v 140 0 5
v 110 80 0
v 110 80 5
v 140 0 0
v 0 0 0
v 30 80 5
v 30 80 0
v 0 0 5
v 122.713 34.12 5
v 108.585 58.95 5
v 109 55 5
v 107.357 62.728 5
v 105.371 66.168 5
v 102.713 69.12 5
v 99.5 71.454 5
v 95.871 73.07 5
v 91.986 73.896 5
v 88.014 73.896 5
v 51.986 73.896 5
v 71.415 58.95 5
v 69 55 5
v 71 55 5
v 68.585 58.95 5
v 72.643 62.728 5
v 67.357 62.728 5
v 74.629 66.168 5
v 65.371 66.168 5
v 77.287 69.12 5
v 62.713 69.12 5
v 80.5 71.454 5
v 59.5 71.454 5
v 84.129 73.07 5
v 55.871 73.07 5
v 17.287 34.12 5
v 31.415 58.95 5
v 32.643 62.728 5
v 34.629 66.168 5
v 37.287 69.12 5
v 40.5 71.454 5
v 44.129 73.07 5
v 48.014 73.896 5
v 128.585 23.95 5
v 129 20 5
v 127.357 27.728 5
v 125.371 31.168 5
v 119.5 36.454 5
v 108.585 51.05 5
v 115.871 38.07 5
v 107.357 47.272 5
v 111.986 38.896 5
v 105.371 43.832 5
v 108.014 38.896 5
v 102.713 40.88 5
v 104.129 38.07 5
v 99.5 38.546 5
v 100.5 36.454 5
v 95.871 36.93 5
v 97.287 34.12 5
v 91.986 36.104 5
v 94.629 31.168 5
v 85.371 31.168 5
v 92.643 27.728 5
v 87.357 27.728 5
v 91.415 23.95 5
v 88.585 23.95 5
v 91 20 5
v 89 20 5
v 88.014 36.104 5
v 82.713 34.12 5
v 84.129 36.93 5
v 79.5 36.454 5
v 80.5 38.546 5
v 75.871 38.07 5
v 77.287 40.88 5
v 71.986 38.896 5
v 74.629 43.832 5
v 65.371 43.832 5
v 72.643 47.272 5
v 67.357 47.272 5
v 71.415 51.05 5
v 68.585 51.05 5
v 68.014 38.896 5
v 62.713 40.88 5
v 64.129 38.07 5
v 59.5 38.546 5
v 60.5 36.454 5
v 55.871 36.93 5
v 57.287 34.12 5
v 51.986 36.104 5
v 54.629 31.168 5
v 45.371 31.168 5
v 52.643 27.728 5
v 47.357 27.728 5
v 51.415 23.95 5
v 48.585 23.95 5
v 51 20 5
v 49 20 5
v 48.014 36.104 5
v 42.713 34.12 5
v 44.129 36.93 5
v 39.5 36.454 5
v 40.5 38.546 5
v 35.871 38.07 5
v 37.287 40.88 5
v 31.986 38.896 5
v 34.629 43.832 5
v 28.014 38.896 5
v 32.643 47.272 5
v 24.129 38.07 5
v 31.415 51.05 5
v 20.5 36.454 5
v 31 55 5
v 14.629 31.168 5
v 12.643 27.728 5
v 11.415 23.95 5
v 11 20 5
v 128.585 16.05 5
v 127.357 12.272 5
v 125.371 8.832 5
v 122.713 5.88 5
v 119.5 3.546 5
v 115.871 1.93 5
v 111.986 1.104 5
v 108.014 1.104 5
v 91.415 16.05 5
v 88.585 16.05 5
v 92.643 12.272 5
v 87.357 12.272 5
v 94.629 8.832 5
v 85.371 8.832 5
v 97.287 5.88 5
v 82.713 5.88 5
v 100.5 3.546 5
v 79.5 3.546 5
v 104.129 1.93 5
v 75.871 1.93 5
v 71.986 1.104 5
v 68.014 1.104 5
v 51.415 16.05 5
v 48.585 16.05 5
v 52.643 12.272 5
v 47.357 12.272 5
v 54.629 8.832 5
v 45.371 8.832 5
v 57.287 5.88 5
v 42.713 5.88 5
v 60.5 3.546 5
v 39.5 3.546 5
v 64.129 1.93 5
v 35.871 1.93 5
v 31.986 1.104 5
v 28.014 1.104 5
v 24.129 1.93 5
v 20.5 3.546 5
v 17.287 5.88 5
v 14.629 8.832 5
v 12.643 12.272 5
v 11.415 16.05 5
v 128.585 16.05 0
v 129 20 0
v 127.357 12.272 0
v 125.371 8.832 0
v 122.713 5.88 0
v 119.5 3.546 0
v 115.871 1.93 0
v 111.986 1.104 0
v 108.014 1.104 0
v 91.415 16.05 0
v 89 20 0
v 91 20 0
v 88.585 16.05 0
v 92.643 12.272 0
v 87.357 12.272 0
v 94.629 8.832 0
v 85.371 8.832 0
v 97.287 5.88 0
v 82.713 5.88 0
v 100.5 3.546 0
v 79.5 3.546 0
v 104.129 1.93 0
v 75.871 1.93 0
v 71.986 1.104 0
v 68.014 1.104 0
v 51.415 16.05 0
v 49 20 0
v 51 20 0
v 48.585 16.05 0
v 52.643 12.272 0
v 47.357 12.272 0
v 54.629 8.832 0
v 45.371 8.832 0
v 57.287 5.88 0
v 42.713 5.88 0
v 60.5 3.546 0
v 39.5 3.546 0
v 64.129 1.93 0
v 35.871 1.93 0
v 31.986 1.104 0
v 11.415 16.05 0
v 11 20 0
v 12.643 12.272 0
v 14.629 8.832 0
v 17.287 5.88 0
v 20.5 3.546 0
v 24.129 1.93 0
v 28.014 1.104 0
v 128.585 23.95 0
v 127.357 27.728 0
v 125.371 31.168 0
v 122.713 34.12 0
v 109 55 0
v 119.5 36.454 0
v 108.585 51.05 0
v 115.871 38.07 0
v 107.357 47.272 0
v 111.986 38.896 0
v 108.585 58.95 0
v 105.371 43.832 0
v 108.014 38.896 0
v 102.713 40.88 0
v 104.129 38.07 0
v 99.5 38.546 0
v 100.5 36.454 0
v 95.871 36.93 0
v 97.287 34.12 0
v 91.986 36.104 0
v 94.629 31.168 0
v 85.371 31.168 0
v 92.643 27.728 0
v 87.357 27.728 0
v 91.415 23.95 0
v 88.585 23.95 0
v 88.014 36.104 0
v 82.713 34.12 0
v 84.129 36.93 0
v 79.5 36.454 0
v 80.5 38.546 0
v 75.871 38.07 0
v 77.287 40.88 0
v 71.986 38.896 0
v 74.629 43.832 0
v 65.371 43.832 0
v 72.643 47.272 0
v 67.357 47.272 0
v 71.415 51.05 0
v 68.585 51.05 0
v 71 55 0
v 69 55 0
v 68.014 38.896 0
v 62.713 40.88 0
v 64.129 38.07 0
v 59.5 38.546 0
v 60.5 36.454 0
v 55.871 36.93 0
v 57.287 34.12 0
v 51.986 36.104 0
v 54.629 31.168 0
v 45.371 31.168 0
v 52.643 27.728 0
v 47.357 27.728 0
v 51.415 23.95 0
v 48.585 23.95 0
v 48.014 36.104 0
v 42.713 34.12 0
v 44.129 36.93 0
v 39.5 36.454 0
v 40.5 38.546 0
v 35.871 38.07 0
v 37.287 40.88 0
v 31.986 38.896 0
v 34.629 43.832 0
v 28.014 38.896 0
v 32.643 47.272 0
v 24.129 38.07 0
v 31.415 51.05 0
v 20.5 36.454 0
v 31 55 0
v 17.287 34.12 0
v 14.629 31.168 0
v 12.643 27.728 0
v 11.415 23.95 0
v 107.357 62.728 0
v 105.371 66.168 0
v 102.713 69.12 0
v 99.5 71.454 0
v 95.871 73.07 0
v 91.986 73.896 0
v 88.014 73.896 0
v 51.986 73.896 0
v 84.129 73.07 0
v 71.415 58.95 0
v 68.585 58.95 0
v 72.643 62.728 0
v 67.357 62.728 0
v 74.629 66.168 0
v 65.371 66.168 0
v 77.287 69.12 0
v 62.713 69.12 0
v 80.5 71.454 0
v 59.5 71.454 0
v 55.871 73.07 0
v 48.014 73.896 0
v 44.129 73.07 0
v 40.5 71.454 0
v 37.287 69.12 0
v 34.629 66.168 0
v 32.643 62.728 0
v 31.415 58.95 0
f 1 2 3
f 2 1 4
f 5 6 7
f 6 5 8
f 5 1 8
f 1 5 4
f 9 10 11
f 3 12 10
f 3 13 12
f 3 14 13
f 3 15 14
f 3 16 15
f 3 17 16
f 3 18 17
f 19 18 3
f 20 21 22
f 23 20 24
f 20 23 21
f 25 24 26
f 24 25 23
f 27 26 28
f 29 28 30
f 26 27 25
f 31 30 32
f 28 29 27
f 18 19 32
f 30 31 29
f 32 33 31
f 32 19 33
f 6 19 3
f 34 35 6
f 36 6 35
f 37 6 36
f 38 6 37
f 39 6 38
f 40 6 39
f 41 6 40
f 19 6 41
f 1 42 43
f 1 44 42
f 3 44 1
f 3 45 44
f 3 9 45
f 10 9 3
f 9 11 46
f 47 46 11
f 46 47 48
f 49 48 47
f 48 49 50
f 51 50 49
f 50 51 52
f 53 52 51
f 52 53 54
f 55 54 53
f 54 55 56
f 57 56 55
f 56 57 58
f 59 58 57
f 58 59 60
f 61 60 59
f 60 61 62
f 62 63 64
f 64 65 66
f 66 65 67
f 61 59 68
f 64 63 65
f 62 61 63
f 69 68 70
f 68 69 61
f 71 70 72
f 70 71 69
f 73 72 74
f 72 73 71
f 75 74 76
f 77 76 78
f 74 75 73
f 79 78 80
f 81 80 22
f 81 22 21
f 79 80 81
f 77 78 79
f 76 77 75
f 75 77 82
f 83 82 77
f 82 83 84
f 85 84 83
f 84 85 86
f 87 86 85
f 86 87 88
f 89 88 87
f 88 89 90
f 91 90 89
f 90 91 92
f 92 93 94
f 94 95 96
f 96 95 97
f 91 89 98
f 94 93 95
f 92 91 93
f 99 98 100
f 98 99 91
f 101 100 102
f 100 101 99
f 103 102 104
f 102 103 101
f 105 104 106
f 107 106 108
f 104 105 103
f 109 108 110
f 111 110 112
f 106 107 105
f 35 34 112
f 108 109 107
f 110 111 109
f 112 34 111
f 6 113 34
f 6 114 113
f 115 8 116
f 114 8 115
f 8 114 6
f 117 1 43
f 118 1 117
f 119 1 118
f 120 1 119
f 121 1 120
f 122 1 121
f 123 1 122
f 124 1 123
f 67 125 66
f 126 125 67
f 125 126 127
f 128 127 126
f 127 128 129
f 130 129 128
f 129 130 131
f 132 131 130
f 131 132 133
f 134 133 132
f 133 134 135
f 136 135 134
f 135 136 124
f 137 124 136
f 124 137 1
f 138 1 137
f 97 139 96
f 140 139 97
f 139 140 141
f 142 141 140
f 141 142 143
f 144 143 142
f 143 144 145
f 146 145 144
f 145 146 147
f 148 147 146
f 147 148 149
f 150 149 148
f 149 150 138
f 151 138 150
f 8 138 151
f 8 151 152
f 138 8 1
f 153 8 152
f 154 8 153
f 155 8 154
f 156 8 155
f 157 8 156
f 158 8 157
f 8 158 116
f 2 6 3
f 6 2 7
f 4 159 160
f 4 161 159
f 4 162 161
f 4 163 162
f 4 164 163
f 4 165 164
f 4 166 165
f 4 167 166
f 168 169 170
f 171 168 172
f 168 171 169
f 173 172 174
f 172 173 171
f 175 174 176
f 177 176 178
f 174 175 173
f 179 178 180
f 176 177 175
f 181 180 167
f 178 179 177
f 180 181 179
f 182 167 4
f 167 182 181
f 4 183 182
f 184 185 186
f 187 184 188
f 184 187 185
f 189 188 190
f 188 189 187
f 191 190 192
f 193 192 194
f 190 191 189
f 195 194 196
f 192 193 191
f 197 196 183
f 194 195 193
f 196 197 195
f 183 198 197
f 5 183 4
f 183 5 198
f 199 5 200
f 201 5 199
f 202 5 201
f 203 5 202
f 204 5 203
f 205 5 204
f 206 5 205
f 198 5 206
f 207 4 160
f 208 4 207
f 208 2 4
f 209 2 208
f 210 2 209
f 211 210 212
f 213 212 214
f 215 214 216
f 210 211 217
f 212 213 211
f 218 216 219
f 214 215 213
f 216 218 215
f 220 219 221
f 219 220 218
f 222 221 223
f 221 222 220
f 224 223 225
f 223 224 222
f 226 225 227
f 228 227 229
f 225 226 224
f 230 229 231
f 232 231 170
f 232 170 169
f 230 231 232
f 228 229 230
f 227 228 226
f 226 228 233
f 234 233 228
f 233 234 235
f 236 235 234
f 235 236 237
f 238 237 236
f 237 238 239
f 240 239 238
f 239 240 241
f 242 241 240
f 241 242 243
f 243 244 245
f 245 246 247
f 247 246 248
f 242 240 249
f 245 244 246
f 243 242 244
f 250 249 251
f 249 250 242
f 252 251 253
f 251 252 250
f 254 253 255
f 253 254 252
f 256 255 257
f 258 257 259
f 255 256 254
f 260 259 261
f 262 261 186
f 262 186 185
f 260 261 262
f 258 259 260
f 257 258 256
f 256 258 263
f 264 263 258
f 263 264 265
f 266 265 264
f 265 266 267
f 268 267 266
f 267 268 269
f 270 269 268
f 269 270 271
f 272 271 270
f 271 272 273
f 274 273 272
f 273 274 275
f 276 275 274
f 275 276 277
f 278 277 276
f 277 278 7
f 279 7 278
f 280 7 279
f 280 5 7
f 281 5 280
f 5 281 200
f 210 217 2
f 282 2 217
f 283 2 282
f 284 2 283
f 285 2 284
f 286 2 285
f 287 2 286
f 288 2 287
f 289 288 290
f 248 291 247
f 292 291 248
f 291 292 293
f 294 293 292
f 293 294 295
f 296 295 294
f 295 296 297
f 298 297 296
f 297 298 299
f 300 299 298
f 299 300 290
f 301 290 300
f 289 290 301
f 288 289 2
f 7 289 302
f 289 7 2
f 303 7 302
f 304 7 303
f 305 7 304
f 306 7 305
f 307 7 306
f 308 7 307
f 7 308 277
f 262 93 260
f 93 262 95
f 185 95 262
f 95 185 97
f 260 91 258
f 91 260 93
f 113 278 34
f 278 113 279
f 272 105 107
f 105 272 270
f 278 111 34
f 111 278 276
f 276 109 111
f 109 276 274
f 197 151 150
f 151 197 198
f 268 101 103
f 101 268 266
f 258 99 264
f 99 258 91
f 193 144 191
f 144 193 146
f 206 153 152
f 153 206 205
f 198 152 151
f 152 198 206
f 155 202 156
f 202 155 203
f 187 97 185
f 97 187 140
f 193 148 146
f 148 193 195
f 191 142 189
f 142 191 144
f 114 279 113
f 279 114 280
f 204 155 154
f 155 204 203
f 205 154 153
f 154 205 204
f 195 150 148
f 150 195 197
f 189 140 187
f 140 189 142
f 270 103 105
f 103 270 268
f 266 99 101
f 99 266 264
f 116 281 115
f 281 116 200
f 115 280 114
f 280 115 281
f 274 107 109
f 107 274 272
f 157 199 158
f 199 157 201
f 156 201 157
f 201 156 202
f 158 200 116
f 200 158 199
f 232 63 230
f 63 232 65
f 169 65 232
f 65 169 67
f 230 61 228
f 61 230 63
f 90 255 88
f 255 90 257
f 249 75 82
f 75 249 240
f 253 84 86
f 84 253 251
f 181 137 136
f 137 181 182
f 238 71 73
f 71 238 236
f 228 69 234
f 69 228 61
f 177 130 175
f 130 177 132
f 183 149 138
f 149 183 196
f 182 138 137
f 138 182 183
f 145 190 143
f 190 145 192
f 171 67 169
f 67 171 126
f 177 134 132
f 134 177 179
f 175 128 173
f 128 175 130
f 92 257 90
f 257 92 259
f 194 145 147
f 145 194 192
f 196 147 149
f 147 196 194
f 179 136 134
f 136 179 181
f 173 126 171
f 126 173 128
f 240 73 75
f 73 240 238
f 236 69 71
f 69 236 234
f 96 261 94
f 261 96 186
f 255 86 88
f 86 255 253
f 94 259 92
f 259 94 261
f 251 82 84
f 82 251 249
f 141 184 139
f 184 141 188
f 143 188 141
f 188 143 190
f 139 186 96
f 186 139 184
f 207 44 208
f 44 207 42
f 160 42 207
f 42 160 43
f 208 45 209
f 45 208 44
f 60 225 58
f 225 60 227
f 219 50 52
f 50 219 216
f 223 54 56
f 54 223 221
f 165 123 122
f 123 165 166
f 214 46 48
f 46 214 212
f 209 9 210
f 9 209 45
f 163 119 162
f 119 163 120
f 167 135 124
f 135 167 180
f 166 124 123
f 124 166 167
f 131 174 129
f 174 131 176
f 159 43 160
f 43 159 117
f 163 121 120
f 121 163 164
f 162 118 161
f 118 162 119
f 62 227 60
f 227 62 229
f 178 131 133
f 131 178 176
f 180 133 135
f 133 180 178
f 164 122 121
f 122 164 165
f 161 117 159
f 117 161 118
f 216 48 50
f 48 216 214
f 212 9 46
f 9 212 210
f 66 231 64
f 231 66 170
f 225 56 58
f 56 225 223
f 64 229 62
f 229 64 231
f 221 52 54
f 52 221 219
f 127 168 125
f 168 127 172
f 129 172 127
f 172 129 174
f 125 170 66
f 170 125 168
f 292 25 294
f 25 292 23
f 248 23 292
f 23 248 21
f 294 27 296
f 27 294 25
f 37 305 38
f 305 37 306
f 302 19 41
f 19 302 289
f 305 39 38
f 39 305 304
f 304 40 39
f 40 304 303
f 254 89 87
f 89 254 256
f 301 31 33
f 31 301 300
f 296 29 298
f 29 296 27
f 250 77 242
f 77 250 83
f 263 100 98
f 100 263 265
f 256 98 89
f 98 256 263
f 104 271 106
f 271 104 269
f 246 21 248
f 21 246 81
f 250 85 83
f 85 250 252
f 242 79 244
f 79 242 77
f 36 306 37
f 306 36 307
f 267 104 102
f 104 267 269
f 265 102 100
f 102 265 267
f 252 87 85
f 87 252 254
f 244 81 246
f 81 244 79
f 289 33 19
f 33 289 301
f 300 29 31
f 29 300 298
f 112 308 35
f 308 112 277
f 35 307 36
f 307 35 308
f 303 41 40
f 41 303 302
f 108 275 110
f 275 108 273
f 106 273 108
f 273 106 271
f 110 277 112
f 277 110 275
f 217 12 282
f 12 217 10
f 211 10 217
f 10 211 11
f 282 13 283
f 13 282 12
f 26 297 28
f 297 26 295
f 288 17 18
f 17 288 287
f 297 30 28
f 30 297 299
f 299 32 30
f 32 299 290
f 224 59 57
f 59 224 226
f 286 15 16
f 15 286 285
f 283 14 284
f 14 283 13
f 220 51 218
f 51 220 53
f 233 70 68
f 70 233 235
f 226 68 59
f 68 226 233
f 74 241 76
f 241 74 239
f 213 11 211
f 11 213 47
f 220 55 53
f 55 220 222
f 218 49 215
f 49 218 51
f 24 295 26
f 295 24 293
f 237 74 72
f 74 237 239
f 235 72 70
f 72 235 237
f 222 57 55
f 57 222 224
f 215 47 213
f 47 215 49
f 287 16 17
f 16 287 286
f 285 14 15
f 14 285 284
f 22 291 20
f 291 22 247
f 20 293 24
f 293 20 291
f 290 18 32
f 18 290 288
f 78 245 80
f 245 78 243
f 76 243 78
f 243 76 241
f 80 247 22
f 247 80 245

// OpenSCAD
color("red")
    translate([0, 0, 0])
    difference() {
        trapezoid(140, 80, 80,5);
        translate([30, 20, -1]) cylinder(h=7, r=19);
        translate([70, 20, -1]) cylinder(h=7, r=19);
        translate([110, 20, -1]) cylinder(h=7, r=19);
        translate([50, 55, -1]) cylinder(h=7, r=19);
        translate([90, 55, -1]) cylinder(h=7, r=19);
    }
      
module trapezoid(width_base, width_top,height,thickness) {

  linear_extrude(height = thickness) polygon(points=[[0,0],[width_base,0],[width_base-(width_base-width_top)/2,height],[(width_base-width_top)/2,height]], paths=[[0,1,2,3]]); 
  
}
